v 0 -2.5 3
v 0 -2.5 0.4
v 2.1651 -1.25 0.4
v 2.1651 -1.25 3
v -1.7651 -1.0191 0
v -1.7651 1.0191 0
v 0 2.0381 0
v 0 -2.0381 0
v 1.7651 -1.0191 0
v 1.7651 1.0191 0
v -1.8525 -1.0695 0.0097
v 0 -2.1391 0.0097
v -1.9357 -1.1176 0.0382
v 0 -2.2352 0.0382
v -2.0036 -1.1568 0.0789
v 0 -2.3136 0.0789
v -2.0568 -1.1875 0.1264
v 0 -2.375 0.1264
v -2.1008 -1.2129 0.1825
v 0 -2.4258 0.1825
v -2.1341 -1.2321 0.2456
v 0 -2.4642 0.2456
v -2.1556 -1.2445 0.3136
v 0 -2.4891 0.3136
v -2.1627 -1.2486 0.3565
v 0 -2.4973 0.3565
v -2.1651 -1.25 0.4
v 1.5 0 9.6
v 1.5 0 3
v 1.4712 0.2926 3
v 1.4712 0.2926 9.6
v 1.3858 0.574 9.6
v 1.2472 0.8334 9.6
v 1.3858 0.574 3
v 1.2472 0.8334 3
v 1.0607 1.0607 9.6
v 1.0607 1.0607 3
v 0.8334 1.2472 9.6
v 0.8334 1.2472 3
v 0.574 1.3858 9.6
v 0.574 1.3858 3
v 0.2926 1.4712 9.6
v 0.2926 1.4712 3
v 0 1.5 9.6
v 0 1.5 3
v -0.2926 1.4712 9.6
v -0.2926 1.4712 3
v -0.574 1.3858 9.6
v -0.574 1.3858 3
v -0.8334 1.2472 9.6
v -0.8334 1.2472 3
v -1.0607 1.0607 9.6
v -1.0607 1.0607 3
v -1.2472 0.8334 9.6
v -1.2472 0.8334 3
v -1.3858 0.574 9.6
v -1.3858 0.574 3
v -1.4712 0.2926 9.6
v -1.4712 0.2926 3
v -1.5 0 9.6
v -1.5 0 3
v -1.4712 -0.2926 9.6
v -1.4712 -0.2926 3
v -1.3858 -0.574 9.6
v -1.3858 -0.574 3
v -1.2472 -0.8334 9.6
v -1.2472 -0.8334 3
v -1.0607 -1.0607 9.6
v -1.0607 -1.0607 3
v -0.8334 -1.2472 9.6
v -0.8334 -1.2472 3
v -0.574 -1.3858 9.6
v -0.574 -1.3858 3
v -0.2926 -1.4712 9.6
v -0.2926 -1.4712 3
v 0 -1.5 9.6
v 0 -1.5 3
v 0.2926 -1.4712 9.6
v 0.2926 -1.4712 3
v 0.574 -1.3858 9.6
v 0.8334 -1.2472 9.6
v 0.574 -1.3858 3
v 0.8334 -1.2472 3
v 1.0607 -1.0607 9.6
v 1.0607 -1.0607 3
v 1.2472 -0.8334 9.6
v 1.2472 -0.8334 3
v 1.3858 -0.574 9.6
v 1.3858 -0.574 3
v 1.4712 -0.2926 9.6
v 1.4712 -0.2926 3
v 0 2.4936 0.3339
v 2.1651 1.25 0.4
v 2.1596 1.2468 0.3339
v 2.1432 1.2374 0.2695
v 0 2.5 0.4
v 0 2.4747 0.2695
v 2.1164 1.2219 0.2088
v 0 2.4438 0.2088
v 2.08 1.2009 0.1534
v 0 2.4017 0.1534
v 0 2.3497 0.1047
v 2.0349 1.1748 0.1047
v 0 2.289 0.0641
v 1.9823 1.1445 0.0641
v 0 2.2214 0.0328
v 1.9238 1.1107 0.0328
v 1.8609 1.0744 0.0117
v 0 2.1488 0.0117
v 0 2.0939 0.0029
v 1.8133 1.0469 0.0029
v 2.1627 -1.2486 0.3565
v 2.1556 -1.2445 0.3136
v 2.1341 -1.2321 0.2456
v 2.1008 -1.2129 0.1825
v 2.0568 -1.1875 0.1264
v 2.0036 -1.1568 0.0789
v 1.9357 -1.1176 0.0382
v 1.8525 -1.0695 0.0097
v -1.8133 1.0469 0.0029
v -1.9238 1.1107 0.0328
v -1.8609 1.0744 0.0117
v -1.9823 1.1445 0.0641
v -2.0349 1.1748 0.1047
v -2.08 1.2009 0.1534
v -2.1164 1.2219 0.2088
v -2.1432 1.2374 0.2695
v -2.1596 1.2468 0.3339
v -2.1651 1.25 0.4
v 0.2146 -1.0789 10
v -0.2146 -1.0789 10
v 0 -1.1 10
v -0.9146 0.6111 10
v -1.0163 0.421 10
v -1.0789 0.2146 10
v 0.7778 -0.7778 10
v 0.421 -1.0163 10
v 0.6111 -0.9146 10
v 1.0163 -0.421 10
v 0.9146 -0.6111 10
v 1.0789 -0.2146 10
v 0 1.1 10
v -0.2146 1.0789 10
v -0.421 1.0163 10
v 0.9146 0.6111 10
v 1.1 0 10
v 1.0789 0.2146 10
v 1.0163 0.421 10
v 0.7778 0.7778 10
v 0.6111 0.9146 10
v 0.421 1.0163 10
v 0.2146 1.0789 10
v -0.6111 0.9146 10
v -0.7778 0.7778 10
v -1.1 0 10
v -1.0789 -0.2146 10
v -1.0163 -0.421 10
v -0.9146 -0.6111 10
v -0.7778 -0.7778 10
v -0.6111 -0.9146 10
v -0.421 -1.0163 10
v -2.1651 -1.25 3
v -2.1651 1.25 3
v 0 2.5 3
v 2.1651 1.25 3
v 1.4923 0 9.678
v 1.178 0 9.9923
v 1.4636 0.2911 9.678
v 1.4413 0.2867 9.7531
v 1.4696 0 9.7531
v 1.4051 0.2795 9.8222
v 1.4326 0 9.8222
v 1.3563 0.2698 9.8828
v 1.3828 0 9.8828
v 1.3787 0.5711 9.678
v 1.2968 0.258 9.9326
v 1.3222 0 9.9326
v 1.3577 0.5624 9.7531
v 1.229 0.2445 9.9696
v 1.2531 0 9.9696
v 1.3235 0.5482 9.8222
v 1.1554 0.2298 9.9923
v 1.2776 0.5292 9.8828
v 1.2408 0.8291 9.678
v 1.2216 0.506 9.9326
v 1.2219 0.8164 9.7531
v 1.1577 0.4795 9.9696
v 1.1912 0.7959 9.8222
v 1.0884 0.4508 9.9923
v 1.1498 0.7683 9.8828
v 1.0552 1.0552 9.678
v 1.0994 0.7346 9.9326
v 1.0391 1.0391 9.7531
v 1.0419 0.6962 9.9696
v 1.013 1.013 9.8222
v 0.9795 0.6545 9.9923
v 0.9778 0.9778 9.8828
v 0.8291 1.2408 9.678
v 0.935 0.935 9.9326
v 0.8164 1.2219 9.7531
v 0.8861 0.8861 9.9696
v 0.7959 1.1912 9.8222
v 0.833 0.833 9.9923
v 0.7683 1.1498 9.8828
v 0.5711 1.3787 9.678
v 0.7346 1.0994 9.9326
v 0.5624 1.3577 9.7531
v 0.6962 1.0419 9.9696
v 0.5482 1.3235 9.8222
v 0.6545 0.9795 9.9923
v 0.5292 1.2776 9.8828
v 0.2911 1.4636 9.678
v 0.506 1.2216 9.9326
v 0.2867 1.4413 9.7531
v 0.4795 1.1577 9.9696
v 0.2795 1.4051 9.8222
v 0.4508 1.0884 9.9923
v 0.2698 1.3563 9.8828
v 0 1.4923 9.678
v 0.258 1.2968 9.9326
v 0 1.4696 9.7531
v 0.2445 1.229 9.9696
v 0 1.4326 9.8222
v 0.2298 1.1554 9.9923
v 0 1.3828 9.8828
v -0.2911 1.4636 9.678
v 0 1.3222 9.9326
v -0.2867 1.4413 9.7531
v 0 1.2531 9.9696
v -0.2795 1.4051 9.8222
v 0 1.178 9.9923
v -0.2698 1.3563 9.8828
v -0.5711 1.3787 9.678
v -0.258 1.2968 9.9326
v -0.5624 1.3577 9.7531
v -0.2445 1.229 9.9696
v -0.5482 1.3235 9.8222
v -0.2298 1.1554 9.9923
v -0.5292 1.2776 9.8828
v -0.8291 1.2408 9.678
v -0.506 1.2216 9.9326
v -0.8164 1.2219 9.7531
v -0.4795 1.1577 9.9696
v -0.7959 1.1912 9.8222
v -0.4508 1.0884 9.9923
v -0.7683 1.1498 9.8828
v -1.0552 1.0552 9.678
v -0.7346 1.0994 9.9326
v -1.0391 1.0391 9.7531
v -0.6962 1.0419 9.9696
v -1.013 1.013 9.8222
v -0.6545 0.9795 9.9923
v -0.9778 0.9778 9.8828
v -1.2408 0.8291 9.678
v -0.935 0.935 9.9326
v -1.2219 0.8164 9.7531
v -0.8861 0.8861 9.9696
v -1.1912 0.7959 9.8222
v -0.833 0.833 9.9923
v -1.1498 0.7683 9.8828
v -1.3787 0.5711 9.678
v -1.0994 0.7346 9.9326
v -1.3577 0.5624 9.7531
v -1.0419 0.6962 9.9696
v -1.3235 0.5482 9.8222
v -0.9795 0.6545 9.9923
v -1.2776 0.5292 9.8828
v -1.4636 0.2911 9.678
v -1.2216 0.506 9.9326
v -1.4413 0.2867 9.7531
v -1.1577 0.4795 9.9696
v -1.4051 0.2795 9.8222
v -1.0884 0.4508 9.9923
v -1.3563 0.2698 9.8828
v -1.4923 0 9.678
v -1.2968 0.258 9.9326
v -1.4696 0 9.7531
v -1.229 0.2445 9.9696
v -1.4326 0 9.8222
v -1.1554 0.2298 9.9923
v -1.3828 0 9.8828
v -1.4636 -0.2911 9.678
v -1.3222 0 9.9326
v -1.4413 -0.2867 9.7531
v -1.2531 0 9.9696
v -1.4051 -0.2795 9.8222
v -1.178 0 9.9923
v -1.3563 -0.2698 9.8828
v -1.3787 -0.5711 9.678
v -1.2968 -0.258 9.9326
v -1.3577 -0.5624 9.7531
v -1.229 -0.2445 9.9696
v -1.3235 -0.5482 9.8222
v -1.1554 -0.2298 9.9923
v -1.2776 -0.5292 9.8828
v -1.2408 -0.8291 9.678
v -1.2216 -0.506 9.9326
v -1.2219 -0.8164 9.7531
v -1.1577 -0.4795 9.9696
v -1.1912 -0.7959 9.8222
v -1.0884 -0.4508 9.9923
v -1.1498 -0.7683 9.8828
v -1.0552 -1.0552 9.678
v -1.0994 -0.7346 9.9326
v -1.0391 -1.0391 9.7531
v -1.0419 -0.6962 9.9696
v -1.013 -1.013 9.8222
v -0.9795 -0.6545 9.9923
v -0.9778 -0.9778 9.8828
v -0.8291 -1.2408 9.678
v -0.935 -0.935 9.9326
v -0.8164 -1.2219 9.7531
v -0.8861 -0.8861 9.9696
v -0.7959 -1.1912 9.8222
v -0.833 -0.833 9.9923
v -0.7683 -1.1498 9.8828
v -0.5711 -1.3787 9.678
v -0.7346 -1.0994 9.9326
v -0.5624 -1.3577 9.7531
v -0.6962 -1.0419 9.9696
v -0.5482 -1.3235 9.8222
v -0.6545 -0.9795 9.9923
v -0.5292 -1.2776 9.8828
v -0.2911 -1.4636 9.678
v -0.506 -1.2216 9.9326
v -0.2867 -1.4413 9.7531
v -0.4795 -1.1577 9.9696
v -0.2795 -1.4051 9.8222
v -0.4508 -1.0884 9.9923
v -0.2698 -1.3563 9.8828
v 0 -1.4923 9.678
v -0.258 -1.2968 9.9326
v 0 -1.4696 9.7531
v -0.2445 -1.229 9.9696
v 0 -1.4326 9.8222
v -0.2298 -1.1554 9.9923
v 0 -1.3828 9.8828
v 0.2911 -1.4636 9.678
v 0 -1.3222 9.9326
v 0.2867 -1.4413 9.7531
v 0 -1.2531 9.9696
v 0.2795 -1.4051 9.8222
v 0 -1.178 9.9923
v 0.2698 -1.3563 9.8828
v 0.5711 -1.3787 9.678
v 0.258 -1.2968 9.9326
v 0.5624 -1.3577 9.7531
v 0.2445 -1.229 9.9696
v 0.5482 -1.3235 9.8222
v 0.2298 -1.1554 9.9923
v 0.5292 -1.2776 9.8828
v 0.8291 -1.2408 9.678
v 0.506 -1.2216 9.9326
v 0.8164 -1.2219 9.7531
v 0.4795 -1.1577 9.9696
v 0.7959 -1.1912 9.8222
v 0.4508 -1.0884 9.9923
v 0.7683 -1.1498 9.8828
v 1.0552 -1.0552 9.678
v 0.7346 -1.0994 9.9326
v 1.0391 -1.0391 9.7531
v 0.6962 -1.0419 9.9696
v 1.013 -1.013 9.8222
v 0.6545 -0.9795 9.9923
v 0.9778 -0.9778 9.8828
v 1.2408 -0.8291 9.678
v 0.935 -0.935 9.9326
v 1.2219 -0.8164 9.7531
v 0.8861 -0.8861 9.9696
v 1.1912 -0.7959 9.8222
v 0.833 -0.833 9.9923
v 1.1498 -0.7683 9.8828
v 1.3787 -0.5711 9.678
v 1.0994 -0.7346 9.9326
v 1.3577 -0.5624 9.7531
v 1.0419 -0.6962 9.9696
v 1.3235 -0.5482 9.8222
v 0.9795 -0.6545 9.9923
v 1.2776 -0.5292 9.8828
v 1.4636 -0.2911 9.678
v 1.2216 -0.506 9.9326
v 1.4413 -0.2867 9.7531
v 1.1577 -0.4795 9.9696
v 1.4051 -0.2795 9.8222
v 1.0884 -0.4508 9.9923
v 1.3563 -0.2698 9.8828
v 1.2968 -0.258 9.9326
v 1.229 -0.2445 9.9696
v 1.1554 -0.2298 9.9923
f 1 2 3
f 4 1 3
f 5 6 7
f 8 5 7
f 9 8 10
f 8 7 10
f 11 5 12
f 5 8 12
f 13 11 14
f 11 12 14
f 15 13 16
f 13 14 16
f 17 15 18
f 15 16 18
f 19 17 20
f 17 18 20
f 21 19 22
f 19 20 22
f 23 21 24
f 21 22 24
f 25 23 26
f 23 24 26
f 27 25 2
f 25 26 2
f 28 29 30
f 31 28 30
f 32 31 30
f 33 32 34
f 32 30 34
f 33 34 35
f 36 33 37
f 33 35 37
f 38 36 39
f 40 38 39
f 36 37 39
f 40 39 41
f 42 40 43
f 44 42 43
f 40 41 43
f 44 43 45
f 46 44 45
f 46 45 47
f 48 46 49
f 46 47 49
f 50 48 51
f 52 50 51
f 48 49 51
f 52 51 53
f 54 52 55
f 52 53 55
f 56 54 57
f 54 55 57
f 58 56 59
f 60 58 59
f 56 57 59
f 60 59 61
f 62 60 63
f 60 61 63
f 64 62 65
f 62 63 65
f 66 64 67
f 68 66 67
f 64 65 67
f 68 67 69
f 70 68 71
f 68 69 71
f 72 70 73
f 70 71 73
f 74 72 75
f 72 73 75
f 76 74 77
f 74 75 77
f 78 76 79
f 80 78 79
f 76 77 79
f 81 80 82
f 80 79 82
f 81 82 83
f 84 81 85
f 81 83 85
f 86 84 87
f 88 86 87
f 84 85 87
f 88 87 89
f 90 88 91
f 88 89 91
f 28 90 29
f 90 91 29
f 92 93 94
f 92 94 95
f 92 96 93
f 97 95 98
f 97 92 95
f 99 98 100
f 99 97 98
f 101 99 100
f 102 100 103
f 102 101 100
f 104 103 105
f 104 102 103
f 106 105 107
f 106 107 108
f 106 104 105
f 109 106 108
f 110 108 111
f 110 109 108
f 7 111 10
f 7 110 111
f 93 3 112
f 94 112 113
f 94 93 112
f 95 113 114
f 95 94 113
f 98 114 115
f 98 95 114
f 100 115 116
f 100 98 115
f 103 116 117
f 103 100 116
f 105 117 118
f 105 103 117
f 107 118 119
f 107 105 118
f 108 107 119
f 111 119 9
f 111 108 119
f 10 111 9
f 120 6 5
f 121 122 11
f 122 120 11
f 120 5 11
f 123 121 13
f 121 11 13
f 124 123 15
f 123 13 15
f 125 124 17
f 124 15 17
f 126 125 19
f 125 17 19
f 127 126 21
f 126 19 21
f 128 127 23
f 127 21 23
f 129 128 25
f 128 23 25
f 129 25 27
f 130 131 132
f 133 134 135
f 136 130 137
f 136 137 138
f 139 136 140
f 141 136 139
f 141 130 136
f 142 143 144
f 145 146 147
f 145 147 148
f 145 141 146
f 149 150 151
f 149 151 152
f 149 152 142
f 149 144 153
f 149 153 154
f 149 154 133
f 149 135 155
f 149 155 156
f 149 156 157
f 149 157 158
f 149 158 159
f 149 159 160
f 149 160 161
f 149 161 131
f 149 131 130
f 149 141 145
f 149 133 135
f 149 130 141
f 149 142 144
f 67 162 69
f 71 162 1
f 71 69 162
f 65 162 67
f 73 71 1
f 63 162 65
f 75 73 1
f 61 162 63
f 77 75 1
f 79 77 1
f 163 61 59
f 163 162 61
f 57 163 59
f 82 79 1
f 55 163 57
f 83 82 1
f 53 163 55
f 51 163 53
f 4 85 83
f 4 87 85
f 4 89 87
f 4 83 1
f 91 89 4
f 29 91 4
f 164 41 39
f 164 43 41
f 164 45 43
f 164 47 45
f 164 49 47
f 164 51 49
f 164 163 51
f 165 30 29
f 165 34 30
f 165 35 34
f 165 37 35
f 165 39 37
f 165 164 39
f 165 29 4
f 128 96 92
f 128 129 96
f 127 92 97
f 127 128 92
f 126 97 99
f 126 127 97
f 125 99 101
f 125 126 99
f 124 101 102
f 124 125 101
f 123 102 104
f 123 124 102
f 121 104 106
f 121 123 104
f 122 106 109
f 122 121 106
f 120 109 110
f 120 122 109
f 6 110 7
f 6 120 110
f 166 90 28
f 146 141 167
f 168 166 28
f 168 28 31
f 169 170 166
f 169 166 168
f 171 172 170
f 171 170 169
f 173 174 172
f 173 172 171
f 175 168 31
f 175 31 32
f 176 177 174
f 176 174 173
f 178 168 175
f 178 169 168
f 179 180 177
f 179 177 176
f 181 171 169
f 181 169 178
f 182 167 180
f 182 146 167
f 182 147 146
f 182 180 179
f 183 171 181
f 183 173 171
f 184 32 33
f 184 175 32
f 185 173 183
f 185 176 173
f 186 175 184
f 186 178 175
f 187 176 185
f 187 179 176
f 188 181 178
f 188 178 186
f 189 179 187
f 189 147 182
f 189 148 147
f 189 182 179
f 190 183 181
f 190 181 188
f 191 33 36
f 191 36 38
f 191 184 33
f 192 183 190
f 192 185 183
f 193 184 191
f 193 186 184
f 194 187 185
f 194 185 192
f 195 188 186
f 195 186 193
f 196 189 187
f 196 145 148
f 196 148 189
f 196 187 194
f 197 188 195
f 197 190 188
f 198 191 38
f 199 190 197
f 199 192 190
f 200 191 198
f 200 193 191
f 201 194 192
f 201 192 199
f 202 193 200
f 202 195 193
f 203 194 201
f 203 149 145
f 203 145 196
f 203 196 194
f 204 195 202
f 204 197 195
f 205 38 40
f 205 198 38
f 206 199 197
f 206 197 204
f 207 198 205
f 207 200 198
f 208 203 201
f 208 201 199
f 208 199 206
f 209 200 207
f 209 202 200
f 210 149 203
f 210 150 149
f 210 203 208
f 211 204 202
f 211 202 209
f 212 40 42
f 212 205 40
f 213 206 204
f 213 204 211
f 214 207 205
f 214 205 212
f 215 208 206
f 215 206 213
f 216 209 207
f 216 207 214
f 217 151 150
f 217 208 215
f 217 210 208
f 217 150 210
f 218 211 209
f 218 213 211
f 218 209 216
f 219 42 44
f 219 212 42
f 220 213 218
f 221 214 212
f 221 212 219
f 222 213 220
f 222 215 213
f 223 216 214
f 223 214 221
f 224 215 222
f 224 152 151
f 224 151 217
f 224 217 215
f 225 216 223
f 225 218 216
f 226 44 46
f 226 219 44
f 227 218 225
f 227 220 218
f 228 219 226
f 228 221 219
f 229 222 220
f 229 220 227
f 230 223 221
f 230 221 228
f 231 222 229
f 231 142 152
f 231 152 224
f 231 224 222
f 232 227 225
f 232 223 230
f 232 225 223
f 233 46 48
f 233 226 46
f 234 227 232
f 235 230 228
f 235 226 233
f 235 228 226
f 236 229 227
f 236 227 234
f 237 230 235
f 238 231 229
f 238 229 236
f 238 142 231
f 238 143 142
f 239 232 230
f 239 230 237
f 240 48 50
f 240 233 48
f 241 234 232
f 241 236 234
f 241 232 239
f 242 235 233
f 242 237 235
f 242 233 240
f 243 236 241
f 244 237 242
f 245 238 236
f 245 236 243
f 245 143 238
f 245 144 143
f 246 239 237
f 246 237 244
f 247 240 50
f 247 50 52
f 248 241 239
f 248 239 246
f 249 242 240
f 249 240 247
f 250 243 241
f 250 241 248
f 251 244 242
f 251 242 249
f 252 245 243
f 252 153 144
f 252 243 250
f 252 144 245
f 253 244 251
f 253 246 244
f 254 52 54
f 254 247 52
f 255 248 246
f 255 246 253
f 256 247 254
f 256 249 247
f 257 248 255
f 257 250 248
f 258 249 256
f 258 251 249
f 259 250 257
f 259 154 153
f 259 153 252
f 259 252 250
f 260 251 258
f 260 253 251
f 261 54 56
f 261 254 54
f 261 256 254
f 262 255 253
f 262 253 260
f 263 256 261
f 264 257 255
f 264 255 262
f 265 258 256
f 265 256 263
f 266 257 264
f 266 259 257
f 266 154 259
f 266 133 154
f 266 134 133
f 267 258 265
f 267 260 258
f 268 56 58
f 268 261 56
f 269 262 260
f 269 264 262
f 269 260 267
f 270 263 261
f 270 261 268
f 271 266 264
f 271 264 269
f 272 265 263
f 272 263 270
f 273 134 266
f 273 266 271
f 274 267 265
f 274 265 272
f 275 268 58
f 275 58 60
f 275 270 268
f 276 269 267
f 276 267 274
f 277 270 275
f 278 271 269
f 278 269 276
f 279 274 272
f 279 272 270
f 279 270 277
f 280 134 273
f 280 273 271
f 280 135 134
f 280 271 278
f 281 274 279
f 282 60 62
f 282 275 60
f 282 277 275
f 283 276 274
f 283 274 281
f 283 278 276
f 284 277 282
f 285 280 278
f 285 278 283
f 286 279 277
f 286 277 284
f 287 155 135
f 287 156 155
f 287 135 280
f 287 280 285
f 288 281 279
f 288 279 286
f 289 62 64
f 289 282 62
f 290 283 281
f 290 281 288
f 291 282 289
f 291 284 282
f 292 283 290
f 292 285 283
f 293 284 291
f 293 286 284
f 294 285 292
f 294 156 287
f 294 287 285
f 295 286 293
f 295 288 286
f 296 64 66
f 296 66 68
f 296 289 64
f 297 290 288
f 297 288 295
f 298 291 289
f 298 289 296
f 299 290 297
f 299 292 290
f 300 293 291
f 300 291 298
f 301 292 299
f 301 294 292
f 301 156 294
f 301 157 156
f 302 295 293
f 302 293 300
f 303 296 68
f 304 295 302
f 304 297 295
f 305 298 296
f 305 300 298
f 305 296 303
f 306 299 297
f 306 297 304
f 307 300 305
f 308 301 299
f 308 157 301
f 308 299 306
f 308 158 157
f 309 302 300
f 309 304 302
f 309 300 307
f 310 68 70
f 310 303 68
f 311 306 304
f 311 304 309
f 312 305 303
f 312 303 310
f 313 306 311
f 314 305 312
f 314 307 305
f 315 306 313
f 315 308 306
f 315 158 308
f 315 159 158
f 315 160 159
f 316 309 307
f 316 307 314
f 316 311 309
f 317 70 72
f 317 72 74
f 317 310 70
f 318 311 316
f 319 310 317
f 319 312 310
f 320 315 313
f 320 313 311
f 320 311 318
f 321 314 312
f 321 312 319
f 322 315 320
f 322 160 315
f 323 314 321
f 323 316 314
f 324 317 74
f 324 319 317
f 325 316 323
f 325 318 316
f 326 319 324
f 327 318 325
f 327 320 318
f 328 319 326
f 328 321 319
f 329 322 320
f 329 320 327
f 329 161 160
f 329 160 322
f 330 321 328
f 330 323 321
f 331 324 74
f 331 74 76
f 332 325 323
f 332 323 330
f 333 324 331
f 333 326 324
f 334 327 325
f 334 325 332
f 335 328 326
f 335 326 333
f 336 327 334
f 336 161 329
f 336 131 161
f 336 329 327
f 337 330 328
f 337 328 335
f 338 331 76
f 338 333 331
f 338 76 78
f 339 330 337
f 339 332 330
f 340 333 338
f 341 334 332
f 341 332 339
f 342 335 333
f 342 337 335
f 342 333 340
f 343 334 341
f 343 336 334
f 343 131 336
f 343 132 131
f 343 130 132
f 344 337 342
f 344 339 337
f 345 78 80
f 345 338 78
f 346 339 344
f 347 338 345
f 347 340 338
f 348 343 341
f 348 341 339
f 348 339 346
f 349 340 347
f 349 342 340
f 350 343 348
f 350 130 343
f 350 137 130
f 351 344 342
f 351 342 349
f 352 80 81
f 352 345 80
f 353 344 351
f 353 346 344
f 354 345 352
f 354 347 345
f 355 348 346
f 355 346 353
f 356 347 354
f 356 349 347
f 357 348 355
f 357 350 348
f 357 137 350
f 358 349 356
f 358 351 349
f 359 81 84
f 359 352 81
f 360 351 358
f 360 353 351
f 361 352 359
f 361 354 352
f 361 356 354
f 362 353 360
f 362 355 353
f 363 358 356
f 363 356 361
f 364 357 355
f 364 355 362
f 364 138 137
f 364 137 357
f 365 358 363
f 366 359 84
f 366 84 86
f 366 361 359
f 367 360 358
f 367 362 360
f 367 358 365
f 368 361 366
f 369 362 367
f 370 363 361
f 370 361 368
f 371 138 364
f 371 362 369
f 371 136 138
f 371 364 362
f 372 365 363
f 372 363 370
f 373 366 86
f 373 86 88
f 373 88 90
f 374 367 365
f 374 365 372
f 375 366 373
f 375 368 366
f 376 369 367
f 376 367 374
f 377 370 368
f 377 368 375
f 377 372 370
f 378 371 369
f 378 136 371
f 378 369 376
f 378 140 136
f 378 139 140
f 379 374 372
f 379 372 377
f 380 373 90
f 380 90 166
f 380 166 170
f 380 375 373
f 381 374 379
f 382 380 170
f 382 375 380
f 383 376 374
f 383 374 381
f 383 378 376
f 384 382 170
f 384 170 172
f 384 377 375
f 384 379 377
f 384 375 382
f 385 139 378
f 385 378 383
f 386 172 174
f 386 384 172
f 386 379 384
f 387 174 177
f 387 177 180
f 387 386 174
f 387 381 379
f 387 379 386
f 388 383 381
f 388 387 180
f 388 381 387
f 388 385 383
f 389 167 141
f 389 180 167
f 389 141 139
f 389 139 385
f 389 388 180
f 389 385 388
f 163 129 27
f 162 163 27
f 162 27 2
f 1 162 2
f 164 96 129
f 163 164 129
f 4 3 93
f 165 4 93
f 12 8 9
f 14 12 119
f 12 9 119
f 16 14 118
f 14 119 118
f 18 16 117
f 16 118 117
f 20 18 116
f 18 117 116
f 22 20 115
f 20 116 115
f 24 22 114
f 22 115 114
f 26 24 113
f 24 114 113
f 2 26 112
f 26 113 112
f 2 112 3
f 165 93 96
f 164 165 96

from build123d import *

# Parameters (mm, degrees)
F1_DEPTH = 3
F2_R     = 1.5
F3_DEPTH = 7
F4_R     = 0.4


with BuildPart() as f1:
    # F0 (on Top) → F1 (new body)
    with BuildSketch(Plane.XY):
        Polygon((2.165064, 1.25), (0, 2.5), (-2.165064, 1.25), (-2.165064, -1.25), (0, -2.5), (2.165064, -1.25), align=None)
    extrude(amount=F1_DEPTH)

    # F2 (on face) → F3 (join)
    with BuildSketch(Plane.XY.offset(3)):
        Circle(F2_R)
    extrude(amount=F3_DEPTH)

    # F4
    f4_edges = [f1.edges().sort_by_distance(p)[0] for p in [
        (-1.082532, 1.875, 0),
        (-2.165064, 0, 0),
        (-1.082532, -1.875, 0),
        (1.082532, -1.875, 0),
        (2.165064, 0, 0),
        (1.082532, 1.875, 0),
        (-1.5, 0, 10),
    ]]
    fillet(f4_edges, radius=F4_R)


solid = f1.part
